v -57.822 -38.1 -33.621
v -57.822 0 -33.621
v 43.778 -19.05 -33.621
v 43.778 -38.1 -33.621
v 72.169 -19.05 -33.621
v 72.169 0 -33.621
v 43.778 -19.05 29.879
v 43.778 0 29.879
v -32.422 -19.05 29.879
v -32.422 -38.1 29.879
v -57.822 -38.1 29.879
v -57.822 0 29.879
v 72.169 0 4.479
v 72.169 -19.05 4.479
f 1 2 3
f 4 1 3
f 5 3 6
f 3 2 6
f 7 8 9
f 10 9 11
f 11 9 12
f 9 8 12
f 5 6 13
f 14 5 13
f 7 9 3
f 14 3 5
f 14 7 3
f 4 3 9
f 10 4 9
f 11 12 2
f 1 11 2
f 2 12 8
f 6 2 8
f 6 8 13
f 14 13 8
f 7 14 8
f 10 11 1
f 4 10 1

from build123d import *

# Parameters (mm, degrees)
F1_DEPTH = 38.1
F3_DEPTH = 19.05


with BuildPart() as f1:
    # F0 (on Front) → F1 (new body)
    with BuildSketch(Plane.XZ):
        Polygon((-32.421868, 29.878679), (-57.821868, 29.878679), (-57.821868, -33.621321), (43.778132, -33.621321), align=None)
    extrude(amount=F1_DEPTH)

    # F2 (on Front) → F3 (join)
    with BuildSketch(Plane.XZ):
        Polygon((-57.821868, 29.878679), (-57.821868, -33.621321), (72.168774, -33.621321), (72.168774, 4.478679), (43.778132, 29.878679), align=None)
    extrude(amount=F3_DEPTH)


solid = f1.part
